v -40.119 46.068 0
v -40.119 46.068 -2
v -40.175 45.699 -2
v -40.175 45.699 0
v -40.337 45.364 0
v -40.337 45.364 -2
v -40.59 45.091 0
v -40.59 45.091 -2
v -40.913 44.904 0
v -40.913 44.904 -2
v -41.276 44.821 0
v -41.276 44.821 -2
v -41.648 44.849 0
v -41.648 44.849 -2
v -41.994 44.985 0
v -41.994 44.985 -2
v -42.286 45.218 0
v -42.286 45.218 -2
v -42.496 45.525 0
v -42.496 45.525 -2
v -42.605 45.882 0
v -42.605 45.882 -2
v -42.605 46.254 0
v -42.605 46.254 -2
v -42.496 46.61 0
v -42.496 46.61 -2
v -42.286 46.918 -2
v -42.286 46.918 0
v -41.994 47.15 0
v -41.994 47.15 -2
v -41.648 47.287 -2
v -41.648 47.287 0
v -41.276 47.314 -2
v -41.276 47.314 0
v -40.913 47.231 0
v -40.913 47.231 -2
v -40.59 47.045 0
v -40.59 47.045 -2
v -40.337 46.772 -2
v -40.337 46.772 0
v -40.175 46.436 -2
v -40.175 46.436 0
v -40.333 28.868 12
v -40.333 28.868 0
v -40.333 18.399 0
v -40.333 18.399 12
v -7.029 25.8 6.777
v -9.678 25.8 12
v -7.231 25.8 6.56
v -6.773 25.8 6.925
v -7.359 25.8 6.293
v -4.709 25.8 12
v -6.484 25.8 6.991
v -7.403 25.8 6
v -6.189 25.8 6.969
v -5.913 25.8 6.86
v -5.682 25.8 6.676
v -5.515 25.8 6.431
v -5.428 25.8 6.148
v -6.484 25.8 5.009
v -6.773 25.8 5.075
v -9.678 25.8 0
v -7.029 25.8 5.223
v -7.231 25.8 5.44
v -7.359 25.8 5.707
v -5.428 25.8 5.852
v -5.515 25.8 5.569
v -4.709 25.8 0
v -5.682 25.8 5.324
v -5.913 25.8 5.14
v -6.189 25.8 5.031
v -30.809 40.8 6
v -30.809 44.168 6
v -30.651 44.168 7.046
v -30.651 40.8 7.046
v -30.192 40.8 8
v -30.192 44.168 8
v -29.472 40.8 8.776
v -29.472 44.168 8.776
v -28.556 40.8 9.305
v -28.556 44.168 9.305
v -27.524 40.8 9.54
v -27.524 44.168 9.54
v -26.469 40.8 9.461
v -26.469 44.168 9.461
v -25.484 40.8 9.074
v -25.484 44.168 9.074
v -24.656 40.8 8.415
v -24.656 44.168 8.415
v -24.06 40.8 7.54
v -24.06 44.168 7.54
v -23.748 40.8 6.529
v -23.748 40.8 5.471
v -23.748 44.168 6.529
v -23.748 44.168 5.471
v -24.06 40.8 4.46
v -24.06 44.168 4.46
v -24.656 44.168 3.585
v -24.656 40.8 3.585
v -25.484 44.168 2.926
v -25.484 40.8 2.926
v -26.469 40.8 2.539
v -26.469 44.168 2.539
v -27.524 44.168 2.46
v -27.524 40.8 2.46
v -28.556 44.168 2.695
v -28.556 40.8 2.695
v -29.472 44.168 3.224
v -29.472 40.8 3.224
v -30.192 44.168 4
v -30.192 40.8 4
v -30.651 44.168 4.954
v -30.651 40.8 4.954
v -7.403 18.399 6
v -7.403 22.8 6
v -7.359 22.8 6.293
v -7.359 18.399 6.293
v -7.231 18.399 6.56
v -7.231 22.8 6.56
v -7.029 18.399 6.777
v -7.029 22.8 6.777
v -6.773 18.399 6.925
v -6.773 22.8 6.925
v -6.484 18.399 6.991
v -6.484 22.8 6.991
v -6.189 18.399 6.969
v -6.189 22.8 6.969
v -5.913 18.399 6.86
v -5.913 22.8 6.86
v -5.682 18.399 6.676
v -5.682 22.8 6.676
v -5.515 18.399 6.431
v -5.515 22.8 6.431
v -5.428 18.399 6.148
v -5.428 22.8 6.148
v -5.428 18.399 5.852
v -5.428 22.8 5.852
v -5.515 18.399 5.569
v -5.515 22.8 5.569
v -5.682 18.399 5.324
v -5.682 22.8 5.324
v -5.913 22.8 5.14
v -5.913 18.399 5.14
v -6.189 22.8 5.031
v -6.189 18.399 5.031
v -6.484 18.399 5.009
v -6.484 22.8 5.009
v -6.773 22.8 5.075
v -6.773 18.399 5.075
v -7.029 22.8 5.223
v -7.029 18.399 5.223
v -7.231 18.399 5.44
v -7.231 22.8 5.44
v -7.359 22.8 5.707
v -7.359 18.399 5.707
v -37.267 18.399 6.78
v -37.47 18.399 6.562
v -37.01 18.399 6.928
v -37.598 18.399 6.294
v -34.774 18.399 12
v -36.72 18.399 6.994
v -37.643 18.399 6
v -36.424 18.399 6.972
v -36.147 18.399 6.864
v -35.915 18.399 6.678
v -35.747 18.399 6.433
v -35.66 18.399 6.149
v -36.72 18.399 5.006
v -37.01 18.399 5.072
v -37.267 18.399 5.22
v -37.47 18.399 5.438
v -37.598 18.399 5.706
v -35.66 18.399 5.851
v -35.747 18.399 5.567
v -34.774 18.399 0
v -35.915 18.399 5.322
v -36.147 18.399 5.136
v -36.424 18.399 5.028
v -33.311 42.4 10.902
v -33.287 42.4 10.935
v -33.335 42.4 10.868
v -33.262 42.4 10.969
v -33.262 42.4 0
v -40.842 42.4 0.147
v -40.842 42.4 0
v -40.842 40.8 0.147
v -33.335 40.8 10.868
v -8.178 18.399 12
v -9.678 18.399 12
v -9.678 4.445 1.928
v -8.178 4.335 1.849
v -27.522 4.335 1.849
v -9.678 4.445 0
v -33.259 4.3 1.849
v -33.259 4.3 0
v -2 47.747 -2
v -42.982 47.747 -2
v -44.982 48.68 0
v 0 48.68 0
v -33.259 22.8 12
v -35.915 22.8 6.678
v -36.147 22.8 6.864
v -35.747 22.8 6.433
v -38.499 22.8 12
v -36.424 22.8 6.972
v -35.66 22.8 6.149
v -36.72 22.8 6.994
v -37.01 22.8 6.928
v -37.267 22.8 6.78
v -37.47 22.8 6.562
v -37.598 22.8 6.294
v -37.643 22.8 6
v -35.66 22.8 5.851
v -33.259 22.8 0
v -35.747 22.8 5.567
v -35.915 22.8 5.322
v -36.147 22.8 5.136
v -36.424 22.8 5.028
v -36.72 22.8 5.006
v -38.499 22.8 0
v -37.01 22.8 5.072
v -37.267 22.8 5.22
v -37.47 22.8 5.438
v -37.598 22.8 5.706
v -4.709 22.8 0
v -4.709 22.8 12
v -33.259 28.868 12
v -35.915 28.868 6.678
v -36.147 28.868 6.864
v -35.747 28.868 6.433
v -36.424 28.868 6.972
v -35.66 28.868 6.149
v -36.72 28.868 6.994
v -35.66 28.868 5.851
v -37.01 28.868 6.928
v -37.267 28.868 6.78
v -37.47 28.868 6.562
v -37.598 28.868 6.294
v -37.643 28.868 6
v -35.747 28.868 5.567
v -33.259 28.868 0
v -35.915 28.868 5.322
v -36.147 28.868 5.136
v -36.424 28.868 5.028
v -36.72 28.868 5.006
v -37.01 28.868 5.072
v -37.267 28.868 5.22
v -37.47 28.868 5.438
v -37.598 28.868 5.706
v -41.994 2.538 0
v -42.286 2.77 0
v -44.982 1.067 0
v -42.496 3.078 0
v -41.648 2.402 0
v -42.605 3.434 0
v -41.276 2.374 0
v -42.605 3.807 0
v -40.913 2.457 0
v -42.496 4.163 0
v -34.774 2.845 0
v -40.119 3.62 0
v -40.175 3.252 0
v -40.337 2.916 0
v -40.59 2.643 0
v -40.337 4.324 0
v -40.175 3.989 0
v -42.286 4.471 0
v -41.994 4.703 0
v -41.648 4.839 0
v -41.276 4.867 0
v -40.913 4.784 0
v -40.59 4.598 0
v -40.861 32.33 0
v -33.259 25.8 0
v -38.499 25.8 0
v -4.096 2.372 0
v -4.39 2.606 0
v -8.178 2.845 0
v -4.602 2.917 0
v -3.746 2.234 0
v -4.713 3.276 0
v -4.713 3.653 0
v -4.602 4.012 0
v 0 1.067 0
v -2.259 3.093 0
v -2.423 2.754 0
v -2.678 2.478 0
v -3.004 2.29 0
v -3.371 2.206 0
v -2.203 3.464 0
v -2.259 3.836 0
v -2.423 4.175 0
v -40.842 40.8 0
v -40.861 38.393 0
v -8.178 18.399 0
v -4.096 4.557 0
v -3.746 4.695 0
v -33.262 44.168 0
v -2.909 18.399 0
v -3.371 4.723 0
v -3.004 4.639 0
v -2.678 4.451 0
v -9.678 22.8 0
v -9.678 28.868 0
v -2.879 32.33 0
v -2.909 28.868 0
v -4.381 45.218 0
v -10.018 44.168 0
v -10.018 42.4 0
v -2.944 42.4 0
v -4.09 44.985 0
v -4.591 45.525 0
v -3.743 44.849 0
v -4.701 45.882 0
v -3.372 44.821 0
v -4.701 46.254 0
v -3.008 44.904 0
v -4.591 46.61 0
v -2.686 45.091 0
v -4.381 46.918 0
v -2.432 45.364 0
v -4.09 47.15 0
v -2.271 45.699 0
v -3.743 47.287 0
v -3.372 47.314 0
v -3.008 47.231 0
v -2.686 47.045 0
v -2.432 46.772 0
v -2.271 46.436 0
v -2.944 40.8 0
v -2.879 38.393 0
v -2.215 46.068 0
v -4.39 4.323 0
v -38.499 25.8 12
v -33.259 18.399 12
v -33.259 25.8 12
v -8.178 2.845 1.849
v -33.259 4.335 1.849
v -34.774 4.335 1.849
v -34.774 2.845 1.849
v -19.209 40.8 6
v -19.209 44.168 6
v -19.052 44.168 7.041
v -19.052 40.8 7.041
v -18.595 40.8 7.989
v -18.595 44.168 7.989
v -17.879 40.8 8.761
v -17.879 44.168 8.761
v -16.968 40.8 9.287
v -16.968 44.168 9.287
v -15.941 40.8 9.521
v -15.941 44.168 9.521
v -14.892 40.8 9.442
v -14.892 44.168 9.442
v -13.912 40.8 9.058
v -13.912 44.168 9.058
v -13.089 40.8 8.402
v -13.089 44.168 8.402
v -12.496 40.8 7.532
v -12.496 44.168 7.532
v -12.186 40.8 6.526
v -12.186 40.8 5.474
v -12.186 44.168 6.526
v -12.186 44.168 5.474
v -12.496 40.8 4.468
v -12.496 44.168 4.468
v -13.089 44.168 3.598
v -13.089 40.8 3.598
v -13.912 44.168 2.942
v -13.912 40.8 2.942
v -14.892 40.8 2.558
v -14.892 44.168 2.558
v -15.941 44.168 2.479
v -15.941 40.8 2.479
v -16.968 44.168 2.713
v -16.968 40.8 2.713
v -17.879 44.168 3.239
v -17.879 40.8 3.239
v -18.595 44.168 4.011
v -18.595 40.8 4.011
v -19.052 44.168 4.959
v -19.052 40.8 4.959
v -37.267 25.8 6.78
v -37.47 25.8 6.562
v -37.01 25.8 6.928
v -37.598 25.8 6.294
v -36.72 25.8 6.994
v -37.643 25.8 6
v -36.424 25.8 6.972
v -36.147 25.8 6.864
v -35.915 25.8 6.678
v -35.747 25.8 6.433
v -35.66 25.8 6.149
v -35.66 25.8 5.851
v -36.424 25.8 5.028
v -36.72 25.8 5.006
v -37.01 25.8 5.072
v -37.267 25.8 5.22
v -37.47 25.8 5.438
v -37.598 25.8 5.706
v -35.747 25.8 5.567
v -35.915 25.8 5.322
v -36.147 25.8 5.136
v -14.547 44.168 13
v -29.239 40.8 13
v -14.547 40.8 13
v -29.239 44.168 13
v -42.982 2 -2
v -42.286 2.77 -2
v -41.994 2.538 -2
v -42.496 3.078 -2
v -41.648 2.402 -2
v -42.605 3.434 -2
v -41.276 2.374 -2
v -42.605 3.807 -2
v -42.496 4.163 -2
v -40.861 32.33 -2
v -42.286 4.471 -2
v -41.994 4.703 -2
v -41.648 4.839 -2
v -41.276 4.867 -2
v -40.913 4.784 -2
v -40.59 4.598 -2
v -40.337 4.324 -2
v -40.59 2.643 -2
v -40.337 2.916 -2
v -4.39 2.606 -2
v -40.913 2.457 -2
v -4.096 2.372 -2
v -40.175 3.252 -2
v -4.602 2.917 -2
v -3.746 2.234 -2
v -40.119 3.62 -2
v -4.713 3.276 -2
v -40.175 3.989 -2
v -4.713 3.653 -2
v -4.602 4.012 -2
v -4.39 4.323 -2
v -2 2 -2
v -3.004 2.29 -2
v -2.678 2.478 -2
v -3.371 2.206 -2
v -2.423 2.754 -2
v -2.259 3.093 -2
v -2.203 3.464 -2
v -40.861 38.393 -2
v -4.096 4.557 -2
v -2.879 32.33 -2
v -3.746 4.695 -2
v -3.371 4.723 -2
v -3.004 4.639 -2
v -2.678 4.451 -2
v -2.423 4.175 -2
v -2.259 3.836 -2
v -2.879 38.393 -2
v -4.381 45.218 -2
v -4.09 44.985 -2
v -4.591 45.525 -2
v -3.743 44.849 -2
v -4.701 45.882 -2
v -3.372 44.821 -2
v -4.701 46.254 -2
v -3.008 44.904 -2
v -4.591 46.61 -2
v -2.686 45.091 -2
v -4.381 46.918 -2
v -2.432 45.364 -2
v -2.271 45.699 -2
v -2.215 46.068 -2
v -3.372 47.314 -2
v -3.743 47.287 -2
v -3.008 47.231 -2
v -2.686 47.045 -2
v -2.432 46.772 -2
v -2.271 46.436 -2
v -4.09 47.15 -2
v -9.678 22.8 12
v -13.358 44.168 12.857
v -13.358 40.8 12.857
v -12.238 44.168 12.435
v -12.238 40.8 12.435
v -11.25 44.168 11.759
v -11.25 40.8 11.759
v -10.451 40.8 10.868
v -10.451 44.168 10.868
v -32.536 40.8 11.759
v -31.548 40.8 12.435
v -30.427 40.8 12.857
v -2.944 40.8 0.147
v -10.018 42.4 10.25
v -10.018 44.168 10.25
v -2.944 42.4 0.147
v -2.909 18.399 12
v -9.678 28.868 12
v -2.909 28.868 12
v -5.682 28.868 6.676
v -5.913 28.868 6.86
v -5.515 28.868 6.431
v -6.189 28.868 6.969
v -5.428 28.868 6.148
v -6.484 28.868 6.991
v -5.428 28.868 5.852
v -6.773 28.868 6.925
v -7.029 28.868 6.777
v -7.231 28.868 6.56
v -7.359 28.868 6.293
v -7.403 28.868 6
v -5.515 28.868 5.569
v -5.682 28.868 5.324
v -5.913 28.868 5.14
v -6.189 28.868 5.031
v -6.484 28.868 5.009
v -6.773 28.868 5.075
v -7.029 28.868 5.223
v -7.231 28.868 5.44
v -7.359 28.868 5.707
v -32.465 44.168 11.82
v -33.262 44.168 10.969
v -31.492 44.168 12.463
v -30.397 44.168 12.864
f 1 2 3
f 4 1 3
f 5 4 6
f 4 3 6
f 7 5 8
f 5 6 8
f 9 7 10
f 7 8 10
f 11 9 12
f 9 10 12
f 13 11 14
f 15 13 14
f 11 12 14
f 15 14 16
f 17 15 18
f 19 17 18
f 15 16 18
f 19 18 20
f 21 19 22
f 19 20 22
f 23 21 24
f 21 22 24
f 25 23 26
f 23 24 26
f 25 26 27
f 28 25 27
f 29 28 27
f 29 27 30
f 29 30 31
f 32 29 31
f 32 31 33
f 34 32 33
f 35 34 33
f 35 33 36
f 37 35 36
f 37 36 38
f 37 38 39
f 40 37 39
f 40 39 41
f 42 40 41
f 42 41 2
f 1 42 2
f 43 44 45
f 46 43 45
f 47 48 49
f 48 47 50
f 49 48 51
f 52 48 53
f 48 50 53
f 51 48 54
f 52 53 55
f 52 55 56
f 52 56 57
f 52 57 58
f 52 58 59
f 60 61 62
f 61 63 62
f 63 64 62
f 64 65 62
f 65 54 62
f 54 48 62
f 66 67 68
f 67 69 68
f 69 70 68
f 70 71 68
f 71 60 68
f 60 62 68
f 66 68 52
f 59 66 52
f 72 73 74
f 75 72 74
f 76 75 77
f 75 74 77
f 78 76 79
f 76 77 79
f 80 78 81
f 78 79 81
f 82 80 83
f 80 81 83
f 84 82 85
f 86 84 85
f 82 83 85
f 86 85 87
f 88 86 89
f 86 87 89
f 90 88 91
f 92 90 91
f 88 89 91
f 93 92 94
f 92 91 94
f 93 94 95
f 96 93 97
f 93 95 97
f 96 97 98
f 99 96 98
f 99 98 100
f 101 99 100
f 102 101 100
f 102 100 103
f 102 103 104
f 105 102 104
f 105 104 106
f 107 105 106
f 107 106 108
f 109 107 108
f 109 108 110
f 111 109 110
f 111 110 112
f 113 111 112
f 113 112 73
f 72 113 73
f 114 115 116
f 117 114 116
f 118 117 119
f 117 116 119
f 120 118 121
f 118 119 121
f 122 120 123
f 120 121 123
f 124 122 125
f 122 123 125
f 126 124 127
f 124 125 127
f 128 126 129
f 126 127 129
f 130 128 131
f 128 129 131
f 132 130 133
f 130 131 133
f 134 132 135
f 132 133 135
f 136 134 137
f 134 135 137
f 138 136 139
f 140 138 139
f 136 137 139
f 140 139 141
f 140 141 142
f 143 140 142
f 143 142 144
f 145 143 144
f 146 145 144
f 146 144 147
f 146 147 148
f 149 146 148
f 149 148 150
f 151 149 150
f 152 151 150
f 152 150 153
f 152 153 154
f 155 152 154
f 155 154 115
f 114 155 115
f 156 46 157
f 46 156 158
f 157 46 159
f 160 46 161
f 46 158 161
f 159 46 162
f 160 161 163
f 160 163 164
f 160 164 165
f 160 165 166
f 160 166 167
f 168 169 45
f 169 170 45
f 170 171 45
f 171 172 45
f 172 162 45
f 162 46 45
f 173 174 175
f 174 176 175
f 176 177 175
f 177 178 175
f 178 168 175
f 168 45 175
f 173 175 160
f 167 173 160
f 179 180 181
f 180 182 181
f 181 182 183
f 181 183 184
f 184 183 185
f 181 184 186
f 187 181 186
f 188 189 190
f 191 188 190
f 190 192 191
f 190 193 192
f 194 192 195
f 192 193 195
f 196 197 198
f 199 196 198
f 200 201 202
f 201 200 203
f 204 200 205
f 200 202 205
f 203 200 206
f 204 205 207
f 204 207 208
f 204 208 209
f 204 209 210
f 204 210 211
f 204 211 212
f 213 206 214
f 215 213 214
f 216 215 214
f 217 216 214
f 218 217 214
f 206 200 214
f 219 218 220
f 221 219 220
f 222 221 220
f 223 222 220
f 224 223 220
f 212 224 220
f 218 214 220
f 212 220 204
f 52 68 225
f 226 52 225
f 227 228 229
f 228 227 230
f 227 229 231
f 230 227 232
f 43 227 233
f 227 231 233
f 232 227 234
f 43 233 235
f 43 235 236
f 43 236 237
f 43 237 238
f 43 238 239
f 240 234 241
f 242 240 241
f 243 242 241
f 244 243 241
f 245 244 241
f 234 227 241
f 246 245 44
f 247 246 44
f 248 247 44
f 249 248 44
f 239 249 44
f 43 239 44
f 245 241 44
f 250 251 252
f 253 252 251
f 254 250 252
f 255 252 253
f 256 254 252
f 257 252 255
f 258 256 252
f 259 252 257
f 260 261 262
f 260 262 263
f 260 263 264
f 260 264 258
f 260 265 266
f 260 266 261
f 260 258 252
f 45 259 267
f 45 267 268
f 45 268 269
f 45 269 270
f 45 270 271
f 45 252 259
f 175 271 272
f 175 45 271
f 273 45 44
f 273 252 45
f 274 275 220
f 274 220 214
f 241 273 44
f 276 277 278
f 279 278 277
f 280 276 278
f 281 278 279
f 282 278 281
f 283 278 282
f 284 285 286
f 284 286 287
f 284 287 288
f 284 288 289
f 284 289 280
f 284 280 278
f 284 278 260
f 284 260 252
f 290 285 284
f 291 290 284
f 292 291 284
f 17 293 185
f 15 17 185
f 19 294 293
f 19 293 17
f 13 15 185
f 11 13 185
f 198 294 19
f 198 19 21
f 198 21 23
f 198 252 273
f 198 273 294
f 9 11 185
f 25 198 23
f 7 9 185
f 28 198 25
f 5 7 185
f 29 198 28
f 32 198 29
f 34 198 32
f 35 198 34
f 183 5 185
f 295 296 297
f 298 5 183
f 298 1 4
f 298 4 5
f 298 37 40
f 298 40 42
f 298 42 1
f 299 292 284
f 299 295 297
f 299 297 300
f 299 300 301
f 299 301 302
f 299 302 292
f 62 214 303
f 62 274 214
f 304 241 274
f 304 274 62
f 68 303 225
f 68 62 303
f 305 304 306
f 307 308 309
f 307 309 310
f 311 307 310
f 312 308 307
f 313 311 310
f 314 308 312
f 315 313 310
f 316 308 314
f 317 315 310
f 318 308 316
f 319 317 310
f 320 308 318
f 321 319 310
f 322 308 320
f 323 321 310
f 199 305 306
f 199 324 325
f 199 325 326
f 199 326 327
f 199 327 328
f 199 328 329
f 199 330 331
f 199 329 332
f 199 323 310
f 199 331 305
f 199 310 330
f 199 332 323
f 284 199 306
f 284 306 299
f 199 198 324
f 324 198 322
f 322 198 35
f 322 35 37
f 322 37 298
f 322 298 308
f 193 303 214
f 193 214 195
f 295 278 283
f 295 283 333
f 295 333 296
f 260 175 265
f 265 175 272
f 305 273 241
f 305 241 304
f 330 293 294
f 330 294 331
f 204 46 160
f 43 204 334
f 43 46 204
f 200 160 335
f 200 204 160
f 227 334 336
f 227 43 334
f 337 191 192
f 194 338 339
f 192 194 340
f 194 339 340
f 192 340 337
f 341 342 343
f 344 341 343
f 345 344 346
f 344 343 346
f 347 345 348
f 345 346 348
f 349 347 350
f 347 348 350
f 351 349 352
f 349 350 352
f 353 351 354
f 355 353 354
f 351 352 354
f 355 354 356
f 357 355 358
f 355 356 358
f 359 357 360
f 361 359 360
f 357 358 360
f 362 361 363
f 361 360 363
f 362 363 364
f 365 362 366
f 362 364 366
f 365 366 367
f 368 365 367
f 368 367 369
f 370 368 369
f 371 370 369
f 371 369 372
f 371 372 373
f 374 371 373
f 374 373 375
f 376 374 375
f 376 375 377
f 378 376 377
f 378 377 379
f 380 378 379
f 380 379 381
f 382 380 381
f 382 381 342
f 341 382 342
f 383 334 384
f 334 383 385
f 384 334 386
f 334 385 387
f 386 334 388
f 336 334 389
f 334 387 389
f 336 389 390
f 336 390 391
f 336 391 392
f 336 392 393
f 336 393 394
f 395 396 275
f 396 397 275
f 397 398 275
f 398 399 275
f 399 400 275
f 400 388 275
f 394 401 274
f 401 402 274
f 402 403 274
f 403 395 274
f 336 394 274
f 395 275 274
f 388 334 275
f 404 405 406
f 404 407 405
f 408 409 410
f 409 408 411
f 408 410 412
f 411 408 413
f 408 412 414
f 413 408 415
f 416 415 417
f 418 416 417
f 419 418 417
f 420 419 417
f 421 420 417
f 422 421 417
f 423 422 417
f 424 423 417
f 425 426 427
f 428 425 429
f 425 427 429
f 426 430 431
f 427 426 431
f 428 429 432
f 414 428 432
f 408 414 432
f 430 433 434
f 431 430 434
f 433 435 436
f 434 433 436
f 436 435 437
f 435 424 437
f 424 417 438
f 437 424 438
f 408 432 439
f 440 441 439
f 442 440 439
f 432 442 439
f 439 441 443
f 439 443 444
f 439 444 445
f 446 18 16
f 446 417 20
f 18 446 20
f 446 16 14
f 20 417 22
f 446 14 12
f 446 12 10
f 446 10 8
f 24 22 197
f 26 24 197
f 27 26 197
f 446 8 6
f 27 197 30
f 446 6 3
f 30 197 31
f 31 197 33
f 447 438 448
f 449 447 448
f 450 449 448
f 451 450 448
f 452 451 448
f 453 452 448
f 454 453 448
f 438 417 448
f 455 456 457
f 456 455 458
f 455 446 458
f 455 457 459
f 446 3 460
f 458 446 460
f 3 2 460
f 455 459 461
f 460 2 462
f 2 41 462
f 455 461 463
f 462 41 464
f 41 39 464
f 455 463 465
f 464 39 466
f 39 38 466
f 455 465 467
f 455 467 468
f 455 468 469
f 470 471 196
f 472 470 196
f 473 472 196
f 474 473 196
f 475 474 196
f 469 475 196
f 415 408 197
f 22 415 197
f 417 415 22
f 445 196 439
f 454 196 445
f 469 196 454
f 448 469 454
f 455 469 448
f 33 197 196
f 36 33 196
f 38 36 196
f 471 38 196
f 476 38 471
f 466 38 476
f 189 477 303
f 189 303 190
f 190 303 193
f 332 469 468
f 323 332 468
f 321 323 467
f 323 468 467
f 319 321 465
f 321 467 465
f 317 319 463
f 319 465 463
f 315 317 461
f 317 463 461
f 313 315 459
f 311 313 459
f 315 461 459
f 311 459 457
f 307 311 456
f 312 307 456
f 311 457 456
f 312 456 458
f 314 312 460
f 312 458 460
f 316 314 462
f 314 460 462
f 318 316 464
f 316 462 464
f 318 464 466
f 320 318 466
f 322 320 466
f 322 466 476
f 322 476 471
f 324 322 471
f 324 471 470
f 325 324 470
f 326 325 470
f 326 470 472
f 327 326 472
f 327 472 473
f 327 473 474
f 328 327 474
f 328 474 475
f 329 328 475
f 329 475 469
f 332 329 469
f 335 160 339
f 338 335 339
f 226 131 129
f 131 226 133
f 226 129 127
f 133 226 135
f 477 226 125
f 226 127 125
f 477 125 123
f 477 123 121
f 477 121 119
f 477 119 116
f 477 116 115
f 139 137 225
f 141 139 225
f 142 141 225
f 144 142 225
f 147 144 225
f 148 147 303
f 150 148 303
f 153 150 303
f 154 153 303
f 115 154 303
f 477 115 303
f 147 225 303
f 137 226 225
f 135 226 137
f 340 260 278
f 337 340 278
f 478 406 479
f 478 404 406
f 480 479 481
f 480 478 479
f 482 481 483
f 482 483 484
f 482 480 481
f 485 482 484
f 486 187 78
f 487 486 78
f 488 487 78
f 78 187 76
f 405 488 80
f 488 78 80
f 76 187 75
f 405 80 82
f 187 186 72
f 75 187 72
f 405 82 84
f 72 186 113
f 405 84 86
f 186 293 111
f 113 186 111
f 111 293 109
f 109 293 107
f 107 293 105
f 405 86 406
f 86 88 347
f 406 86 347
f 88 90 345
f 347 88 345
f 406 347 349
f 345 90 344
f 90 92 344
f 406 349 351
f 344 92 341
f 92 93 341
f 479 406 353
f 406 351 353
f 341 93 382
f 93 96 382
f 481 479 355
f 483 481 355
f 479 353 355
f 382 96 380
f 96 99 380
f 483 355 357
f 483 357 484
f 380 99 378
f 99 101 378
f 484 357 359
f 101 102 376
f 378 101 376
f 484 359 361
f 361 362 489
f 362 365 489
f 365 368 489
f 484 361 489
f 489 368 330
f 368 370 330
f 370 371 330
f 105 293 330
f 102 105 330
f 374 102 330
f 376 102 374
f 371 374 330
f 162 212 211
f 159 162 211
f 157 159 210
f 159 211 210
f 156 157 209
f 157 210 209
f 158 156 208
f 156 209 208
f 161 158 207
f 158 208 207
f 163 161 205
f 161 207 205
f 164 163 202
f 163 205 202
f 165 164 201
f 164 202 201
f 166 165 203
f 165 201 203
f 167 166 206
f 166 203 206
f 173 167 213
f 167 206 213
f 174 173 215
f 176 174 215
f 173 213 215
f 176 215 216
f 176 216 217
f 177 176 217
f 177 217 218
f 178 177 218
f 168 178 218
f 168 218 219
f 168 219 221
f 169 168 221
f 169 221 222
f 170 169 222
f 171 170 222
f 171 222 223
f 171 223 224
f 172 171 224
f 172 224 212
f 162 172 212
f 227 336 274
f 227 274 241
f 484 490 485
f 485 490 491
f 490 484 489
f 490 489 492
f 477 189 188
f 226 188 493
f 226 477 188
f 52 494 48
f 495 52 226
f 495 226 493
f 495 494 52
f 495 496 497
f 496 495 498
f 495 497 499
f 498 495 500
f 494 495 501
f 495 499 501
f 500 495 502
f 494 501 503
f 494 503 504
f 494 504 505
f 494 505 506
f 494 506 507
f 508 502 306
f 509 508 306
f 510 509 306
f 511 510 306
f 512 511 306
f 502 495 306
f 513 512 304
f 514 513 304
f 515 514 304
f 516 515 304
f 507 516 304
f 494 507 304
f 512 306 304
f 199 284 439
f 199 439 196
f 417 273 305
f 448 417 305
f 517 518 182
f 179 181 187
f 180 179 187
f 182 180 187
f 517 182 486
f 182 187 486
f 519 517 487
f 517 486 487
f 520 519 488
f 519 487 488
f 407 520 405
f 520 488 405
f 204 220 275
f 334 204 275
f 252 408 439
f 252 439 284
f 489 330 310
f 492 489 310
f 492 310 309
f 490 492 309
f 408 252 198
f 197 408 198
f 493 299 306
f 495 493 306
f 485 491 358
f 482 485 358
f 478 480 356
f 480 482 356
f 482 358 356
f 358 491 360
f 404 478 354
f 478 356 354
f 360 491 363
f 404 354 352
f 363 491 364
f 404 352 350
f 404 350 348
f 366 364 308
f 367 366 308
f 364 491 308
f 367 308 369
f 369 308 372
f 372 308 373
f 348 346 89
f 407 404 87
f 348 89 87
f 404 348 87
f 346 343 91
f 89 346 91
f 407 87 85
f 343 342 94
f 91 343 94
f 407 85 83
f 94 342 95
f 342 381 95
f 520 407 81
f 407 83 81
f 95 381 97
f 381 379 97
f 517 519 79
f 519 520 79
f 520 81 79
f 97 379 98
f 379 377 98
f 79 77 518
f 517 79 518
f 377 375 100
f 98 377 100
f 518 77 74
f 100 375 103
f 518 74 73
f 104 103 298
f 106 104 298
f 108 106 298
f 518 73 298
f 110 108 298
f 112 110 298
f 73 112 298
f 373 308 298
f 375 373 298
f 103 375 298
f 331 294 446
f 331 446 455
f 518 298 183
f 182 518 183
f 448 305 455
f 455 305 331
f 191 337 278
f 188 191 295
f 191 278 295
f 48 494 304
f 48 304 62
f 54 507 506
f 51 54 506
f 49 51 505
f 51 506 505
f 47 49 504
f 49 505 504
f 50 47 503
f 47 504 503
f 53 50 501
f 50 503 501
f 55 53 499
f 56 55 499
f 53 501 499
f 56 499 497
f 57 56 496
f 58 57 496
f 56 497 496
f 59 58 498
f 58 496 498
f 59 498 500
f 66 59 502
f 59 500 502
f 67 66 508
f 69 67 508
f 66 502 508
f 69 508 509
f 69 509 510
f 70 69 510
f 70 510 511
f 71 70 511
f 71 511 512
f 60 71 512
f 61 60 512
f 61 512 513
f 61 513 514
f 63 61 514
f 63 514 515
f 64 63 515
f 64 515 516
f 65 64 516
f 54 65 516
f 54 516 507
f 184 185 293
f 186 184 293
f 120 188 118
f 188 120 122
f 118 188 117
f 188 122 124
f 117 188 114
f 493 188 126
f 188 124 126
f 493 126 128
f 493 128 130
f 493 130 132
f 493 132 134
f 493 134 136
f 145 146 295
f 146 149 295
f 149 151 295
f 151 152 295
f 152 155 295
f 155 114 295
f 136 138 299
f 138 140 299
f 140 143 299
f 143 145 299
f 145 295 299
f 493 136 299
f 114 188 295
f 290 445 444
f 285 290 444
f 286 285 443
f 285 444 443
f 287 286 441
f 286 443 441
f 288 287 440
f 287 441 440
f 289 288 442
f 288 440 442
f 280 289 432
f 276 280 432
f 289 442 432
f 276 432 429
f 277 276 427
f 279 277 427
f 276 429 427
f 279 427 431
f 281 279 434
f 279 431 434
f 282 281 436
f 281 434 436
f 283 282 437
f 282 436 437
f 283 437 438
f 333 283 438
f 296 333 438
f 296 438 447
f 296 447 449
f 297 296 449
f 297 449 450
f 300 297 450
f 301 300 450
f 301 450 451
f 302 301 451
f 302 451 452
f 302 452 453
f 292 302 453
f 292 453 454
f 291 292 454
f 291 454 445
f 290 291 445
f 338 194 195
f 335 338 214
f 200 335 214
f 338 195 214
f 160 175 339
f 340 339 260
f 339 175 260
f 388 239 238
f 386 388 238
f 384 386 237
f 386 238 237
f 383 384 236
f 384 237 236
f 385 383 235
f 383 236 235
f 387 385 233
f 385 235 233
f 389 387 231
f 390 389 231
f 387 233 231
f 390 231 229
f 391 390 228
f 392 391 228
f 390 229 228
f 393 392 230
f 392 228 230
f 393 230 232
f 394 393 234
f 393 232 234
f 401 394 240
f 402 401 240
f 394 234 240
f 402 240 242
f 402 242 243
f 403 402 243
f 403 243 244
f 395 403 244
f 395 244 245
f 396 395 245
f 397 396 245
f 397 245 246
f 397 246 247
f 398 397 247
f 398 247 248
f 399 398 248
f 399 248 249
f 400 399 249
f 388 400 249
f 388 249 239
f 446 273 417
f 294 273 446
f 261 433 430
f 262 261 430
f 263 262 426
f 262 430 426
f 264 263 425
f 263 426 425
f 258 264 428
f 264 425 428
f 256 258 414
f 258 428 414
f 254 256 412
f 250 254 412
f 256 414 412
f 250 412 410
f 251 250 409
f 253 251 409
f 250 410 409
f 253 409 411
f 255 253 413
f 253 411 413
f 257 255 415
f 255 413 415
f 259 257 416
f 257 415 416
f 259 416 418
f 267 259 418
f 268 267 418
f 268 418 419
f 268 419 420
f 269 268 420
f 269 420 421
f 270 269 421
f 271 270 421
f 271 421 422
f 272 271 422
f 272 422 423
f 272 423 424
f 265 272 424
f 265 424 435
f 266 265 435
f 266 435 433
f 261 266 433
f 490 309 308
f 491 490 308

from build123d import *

# Parameters (mm, degrees)
F0_W         = 44.9817739427
F0_H         = 49.7469753027
F3_DEPTH     = 2
F4_DEPTH     = 12
F2_W         = 37.9821762908
F2_H         = 6.06366992
F5_DEPTH     = 6.6
F6_DEPTH     = 13
F7_R         = 3.5309507028
F7_R_2       = 3.55
F8_DEPTH     = 5
F9_SIZE2     = 12.8533320607
F9_SIZE      = 9
F10_R        = 5
F11_R        = 0.9934278603
F12_DEPTH    = 11
F13_R        = 0.9970874125
F14_DEPTH    = 11
F15_R        = 1.25
F15_R_2      = 1.261860196
F16_DEPTH    = 4
F18_DEPTH    = 29.1
F19_SIZE     = 1.99999
F20_T1_DEPTH = 63.2072532601


# Not quite as in the source:
# - a fillet or chamfer that OpenCascade refuses, or shapes differently, is made with other operations: its cross-section is extruded or revolved along the edge and cut away or added
# - a fillet or chamfer is up to 0.001 mm smaller than in the source, because OpenCascade refuses the exact size


with BuildPart() as f3:
    # F0 (on Top) → F3 (new body)
    with BuildSketch(Plane.XY):
        with Locations((-22.4908869714, 24.8734876513)):
            Rectangle(F0_W, F0_H)
    extrude(amount=-F3_DEPTH)

    # F1 (on face) → F4 (join)
    with BuildSketch(Plane.XY):
        Polygon((-9.6775945276, 22.7995335534), (-9.6775945276, 4.4446666725), (-33.2585461438, 4.2995335534), (-33.2585461438, 22.7995335534), (-38.4990237653, 22.7995335534), (-38.4990237653, 25.7995335534), (-33.2585461438, 25.7995335534), (-33.2585461438, 28.8677942008), (-40.3328314424, 28.8677942008), (-40.3328314424, 18.3987934142), (-34.7744636238, 18.3987934142), (-34.7744636238, 2.8445292264), (-8.1775945276, 2.8445292264), (-8.1775945276, 18.3987934142), (-2.9087525018, 18.3987934142), (-2.9087525018, 28.8677942008), (-9.6775945276, 28.8677942008), (-9.6775945276, 25.7995335534), (-4.7087525018, 25.7995335534), (-4.7087525018, 22.7995335534), align=None)
    extrude(amount=F4_DEPTH)

    # F2 (on Top) → F5 (cut)
    with BuildSketch(Plane.XY):
        with Locations((-21.8701980775, 35.3616550565)):
            Rectangle(F2_W, F2_H)
    extrude(amount=-F5_DEPTH, mode=Mode.SUBTRACT)

    # F1 (on face) → F6 (join)
    with BuildSketch(Plane.XY):
        Polygon((-40.8417806029, 42.3996723965), (-40.8417806029, 40.7995335534), (-2.9438226484, 40.7995335534), (-2.9438226484, 42.3996723965), (-10.0181093439, 42.3996723965), (-10.0181093439, 44.1682427898), (-33.2621894777, 44.1682427898), (-33.2621894777, 42.3996723965), align=None)
    extrude(amount=F6_DEPTH)

    # F7 (on face) → F8 (cut)
    with BuildSketch(Plane(origin=(0, 44.1682427898, 0), x_dir=(-1, 0, 0), z_dir=(0, 1, 0))):
        with Locations((15.6775945276, 6)):
            Circle(F7_R)
        with Locations((27.2585461438, 6)):
            Circle(F7_R_2)
    extrude(amount=-F8_DEPTH, mode=Mode.SUBTRACT)

    # F9
    f9_edges = [f3.edges().sort_by_distance(p)[0] for p in [
        (-40.841781, 41.599603, 13),
        (-2.943823, 41.599603, 13),
    ]]
    f9_side = f3.faces().sort_by_distance((-21.790726, 42.280107, 13))[0]
    chamfer(f9_edges, length=F9_SIZE, length2=F9_SIZE2, reference=f9_side)

    # F10
    f10_edges = [f3.edges().sort_by_distance(p)[0] for p in [
        (-11.943823, 42.483888, 13),
        (-31.841781, 42.483888, 13),
    ]]
    fillet(f10_edges, radius=F10_R)

    # F11 (on face) → F12 (cut)
    with BuildSketch(Plane(origin=(0, 28.8677942008, 0), x_dir=(-1, 0, 0), z_dir=(0, 1, 0))):
        with Locations((6.41001435, 6)):
            Circle(F11_R)
    extrude(amount=-F12_DEPTH, mode=Mode.SUBTRACT)

    # F13 (on face) → F14 (cut)
    with BuildSketch(Plane(origin=(0, 28.8677942008, 0), x_dir=(-1, 0, 0), z_dir=(0, 1, 0))):
        with Locations((36.6457030177, 6)):
            Circle(F13_R)
    extrude(amount=-F14_DEPTH, mode=Mode.SUBTRACT)

    # F15 (on face) → F16 (cut)
    with BuildSketch(Plane(origin=(0, 0, -2), x_dir=(1, 0, 0), z_dir=(0, 0, -1))):
        with Locations((-41.3694195449, -3.6203172058)):
            Circle(F15_R)
        with Locations((-3.4651088063, -3.4644450061)):
            Circle(F15_R_2)
        with Locations((-41.3694195449, -46.0678450763)):
            Circle(F15_R)
        with Locations((-3.4651088063, -46.0678450763)):
            Circle(F15_R)
    extrude(amount=-F16_DEPTH, mode=Mode.SUBTRACT)

    # F17 (on face) → F18 (cut)
    with BuildSketch(Plane(origin=(-34.7744636238, 0, 0), x_dir=(0, -1, 0), z_dir=(-1, 0, 0))):
        Polygon((-2.8445292264, 12), (-18.3987934142, 12), (-4.3348377745, 1.8491647206), (-2.8445292264, 1.8491647206), align=None)
    extrude(amount=-F18_DEPTH, mode=Mode.SUBTRACT)

    # F19 (size 2 in the source; OpenCascade refuses exactly that, so slightly less here)
    f19_edges = [f3.edges().sort_by_distance(p)[0] for p in [
        (-44.981774, 24.873488, -2),
        (0, 24.873488, -2),
    ]]
    chamfer(f19_edges, length=F19_SIZE)

    # F20: chamfer of 2 x 4.289013841 on 2 edges, made by hand

    # F20_s2 → F20_t1 (cut)
    with BuildSketch(Plane.YZ.offset(-54.0945136014)):
        Polygon((2, -2), (0, 2.289013841), (0, -2), align=None)
        Polygon((47.7469753027, -2), (49.7469753027, 2.289013841), (49.7469753027, -2), align=None)
    extrude(amount=F20_T1_DEPTH, mode=Mode.SUBTRACT)


solid = f3.part
